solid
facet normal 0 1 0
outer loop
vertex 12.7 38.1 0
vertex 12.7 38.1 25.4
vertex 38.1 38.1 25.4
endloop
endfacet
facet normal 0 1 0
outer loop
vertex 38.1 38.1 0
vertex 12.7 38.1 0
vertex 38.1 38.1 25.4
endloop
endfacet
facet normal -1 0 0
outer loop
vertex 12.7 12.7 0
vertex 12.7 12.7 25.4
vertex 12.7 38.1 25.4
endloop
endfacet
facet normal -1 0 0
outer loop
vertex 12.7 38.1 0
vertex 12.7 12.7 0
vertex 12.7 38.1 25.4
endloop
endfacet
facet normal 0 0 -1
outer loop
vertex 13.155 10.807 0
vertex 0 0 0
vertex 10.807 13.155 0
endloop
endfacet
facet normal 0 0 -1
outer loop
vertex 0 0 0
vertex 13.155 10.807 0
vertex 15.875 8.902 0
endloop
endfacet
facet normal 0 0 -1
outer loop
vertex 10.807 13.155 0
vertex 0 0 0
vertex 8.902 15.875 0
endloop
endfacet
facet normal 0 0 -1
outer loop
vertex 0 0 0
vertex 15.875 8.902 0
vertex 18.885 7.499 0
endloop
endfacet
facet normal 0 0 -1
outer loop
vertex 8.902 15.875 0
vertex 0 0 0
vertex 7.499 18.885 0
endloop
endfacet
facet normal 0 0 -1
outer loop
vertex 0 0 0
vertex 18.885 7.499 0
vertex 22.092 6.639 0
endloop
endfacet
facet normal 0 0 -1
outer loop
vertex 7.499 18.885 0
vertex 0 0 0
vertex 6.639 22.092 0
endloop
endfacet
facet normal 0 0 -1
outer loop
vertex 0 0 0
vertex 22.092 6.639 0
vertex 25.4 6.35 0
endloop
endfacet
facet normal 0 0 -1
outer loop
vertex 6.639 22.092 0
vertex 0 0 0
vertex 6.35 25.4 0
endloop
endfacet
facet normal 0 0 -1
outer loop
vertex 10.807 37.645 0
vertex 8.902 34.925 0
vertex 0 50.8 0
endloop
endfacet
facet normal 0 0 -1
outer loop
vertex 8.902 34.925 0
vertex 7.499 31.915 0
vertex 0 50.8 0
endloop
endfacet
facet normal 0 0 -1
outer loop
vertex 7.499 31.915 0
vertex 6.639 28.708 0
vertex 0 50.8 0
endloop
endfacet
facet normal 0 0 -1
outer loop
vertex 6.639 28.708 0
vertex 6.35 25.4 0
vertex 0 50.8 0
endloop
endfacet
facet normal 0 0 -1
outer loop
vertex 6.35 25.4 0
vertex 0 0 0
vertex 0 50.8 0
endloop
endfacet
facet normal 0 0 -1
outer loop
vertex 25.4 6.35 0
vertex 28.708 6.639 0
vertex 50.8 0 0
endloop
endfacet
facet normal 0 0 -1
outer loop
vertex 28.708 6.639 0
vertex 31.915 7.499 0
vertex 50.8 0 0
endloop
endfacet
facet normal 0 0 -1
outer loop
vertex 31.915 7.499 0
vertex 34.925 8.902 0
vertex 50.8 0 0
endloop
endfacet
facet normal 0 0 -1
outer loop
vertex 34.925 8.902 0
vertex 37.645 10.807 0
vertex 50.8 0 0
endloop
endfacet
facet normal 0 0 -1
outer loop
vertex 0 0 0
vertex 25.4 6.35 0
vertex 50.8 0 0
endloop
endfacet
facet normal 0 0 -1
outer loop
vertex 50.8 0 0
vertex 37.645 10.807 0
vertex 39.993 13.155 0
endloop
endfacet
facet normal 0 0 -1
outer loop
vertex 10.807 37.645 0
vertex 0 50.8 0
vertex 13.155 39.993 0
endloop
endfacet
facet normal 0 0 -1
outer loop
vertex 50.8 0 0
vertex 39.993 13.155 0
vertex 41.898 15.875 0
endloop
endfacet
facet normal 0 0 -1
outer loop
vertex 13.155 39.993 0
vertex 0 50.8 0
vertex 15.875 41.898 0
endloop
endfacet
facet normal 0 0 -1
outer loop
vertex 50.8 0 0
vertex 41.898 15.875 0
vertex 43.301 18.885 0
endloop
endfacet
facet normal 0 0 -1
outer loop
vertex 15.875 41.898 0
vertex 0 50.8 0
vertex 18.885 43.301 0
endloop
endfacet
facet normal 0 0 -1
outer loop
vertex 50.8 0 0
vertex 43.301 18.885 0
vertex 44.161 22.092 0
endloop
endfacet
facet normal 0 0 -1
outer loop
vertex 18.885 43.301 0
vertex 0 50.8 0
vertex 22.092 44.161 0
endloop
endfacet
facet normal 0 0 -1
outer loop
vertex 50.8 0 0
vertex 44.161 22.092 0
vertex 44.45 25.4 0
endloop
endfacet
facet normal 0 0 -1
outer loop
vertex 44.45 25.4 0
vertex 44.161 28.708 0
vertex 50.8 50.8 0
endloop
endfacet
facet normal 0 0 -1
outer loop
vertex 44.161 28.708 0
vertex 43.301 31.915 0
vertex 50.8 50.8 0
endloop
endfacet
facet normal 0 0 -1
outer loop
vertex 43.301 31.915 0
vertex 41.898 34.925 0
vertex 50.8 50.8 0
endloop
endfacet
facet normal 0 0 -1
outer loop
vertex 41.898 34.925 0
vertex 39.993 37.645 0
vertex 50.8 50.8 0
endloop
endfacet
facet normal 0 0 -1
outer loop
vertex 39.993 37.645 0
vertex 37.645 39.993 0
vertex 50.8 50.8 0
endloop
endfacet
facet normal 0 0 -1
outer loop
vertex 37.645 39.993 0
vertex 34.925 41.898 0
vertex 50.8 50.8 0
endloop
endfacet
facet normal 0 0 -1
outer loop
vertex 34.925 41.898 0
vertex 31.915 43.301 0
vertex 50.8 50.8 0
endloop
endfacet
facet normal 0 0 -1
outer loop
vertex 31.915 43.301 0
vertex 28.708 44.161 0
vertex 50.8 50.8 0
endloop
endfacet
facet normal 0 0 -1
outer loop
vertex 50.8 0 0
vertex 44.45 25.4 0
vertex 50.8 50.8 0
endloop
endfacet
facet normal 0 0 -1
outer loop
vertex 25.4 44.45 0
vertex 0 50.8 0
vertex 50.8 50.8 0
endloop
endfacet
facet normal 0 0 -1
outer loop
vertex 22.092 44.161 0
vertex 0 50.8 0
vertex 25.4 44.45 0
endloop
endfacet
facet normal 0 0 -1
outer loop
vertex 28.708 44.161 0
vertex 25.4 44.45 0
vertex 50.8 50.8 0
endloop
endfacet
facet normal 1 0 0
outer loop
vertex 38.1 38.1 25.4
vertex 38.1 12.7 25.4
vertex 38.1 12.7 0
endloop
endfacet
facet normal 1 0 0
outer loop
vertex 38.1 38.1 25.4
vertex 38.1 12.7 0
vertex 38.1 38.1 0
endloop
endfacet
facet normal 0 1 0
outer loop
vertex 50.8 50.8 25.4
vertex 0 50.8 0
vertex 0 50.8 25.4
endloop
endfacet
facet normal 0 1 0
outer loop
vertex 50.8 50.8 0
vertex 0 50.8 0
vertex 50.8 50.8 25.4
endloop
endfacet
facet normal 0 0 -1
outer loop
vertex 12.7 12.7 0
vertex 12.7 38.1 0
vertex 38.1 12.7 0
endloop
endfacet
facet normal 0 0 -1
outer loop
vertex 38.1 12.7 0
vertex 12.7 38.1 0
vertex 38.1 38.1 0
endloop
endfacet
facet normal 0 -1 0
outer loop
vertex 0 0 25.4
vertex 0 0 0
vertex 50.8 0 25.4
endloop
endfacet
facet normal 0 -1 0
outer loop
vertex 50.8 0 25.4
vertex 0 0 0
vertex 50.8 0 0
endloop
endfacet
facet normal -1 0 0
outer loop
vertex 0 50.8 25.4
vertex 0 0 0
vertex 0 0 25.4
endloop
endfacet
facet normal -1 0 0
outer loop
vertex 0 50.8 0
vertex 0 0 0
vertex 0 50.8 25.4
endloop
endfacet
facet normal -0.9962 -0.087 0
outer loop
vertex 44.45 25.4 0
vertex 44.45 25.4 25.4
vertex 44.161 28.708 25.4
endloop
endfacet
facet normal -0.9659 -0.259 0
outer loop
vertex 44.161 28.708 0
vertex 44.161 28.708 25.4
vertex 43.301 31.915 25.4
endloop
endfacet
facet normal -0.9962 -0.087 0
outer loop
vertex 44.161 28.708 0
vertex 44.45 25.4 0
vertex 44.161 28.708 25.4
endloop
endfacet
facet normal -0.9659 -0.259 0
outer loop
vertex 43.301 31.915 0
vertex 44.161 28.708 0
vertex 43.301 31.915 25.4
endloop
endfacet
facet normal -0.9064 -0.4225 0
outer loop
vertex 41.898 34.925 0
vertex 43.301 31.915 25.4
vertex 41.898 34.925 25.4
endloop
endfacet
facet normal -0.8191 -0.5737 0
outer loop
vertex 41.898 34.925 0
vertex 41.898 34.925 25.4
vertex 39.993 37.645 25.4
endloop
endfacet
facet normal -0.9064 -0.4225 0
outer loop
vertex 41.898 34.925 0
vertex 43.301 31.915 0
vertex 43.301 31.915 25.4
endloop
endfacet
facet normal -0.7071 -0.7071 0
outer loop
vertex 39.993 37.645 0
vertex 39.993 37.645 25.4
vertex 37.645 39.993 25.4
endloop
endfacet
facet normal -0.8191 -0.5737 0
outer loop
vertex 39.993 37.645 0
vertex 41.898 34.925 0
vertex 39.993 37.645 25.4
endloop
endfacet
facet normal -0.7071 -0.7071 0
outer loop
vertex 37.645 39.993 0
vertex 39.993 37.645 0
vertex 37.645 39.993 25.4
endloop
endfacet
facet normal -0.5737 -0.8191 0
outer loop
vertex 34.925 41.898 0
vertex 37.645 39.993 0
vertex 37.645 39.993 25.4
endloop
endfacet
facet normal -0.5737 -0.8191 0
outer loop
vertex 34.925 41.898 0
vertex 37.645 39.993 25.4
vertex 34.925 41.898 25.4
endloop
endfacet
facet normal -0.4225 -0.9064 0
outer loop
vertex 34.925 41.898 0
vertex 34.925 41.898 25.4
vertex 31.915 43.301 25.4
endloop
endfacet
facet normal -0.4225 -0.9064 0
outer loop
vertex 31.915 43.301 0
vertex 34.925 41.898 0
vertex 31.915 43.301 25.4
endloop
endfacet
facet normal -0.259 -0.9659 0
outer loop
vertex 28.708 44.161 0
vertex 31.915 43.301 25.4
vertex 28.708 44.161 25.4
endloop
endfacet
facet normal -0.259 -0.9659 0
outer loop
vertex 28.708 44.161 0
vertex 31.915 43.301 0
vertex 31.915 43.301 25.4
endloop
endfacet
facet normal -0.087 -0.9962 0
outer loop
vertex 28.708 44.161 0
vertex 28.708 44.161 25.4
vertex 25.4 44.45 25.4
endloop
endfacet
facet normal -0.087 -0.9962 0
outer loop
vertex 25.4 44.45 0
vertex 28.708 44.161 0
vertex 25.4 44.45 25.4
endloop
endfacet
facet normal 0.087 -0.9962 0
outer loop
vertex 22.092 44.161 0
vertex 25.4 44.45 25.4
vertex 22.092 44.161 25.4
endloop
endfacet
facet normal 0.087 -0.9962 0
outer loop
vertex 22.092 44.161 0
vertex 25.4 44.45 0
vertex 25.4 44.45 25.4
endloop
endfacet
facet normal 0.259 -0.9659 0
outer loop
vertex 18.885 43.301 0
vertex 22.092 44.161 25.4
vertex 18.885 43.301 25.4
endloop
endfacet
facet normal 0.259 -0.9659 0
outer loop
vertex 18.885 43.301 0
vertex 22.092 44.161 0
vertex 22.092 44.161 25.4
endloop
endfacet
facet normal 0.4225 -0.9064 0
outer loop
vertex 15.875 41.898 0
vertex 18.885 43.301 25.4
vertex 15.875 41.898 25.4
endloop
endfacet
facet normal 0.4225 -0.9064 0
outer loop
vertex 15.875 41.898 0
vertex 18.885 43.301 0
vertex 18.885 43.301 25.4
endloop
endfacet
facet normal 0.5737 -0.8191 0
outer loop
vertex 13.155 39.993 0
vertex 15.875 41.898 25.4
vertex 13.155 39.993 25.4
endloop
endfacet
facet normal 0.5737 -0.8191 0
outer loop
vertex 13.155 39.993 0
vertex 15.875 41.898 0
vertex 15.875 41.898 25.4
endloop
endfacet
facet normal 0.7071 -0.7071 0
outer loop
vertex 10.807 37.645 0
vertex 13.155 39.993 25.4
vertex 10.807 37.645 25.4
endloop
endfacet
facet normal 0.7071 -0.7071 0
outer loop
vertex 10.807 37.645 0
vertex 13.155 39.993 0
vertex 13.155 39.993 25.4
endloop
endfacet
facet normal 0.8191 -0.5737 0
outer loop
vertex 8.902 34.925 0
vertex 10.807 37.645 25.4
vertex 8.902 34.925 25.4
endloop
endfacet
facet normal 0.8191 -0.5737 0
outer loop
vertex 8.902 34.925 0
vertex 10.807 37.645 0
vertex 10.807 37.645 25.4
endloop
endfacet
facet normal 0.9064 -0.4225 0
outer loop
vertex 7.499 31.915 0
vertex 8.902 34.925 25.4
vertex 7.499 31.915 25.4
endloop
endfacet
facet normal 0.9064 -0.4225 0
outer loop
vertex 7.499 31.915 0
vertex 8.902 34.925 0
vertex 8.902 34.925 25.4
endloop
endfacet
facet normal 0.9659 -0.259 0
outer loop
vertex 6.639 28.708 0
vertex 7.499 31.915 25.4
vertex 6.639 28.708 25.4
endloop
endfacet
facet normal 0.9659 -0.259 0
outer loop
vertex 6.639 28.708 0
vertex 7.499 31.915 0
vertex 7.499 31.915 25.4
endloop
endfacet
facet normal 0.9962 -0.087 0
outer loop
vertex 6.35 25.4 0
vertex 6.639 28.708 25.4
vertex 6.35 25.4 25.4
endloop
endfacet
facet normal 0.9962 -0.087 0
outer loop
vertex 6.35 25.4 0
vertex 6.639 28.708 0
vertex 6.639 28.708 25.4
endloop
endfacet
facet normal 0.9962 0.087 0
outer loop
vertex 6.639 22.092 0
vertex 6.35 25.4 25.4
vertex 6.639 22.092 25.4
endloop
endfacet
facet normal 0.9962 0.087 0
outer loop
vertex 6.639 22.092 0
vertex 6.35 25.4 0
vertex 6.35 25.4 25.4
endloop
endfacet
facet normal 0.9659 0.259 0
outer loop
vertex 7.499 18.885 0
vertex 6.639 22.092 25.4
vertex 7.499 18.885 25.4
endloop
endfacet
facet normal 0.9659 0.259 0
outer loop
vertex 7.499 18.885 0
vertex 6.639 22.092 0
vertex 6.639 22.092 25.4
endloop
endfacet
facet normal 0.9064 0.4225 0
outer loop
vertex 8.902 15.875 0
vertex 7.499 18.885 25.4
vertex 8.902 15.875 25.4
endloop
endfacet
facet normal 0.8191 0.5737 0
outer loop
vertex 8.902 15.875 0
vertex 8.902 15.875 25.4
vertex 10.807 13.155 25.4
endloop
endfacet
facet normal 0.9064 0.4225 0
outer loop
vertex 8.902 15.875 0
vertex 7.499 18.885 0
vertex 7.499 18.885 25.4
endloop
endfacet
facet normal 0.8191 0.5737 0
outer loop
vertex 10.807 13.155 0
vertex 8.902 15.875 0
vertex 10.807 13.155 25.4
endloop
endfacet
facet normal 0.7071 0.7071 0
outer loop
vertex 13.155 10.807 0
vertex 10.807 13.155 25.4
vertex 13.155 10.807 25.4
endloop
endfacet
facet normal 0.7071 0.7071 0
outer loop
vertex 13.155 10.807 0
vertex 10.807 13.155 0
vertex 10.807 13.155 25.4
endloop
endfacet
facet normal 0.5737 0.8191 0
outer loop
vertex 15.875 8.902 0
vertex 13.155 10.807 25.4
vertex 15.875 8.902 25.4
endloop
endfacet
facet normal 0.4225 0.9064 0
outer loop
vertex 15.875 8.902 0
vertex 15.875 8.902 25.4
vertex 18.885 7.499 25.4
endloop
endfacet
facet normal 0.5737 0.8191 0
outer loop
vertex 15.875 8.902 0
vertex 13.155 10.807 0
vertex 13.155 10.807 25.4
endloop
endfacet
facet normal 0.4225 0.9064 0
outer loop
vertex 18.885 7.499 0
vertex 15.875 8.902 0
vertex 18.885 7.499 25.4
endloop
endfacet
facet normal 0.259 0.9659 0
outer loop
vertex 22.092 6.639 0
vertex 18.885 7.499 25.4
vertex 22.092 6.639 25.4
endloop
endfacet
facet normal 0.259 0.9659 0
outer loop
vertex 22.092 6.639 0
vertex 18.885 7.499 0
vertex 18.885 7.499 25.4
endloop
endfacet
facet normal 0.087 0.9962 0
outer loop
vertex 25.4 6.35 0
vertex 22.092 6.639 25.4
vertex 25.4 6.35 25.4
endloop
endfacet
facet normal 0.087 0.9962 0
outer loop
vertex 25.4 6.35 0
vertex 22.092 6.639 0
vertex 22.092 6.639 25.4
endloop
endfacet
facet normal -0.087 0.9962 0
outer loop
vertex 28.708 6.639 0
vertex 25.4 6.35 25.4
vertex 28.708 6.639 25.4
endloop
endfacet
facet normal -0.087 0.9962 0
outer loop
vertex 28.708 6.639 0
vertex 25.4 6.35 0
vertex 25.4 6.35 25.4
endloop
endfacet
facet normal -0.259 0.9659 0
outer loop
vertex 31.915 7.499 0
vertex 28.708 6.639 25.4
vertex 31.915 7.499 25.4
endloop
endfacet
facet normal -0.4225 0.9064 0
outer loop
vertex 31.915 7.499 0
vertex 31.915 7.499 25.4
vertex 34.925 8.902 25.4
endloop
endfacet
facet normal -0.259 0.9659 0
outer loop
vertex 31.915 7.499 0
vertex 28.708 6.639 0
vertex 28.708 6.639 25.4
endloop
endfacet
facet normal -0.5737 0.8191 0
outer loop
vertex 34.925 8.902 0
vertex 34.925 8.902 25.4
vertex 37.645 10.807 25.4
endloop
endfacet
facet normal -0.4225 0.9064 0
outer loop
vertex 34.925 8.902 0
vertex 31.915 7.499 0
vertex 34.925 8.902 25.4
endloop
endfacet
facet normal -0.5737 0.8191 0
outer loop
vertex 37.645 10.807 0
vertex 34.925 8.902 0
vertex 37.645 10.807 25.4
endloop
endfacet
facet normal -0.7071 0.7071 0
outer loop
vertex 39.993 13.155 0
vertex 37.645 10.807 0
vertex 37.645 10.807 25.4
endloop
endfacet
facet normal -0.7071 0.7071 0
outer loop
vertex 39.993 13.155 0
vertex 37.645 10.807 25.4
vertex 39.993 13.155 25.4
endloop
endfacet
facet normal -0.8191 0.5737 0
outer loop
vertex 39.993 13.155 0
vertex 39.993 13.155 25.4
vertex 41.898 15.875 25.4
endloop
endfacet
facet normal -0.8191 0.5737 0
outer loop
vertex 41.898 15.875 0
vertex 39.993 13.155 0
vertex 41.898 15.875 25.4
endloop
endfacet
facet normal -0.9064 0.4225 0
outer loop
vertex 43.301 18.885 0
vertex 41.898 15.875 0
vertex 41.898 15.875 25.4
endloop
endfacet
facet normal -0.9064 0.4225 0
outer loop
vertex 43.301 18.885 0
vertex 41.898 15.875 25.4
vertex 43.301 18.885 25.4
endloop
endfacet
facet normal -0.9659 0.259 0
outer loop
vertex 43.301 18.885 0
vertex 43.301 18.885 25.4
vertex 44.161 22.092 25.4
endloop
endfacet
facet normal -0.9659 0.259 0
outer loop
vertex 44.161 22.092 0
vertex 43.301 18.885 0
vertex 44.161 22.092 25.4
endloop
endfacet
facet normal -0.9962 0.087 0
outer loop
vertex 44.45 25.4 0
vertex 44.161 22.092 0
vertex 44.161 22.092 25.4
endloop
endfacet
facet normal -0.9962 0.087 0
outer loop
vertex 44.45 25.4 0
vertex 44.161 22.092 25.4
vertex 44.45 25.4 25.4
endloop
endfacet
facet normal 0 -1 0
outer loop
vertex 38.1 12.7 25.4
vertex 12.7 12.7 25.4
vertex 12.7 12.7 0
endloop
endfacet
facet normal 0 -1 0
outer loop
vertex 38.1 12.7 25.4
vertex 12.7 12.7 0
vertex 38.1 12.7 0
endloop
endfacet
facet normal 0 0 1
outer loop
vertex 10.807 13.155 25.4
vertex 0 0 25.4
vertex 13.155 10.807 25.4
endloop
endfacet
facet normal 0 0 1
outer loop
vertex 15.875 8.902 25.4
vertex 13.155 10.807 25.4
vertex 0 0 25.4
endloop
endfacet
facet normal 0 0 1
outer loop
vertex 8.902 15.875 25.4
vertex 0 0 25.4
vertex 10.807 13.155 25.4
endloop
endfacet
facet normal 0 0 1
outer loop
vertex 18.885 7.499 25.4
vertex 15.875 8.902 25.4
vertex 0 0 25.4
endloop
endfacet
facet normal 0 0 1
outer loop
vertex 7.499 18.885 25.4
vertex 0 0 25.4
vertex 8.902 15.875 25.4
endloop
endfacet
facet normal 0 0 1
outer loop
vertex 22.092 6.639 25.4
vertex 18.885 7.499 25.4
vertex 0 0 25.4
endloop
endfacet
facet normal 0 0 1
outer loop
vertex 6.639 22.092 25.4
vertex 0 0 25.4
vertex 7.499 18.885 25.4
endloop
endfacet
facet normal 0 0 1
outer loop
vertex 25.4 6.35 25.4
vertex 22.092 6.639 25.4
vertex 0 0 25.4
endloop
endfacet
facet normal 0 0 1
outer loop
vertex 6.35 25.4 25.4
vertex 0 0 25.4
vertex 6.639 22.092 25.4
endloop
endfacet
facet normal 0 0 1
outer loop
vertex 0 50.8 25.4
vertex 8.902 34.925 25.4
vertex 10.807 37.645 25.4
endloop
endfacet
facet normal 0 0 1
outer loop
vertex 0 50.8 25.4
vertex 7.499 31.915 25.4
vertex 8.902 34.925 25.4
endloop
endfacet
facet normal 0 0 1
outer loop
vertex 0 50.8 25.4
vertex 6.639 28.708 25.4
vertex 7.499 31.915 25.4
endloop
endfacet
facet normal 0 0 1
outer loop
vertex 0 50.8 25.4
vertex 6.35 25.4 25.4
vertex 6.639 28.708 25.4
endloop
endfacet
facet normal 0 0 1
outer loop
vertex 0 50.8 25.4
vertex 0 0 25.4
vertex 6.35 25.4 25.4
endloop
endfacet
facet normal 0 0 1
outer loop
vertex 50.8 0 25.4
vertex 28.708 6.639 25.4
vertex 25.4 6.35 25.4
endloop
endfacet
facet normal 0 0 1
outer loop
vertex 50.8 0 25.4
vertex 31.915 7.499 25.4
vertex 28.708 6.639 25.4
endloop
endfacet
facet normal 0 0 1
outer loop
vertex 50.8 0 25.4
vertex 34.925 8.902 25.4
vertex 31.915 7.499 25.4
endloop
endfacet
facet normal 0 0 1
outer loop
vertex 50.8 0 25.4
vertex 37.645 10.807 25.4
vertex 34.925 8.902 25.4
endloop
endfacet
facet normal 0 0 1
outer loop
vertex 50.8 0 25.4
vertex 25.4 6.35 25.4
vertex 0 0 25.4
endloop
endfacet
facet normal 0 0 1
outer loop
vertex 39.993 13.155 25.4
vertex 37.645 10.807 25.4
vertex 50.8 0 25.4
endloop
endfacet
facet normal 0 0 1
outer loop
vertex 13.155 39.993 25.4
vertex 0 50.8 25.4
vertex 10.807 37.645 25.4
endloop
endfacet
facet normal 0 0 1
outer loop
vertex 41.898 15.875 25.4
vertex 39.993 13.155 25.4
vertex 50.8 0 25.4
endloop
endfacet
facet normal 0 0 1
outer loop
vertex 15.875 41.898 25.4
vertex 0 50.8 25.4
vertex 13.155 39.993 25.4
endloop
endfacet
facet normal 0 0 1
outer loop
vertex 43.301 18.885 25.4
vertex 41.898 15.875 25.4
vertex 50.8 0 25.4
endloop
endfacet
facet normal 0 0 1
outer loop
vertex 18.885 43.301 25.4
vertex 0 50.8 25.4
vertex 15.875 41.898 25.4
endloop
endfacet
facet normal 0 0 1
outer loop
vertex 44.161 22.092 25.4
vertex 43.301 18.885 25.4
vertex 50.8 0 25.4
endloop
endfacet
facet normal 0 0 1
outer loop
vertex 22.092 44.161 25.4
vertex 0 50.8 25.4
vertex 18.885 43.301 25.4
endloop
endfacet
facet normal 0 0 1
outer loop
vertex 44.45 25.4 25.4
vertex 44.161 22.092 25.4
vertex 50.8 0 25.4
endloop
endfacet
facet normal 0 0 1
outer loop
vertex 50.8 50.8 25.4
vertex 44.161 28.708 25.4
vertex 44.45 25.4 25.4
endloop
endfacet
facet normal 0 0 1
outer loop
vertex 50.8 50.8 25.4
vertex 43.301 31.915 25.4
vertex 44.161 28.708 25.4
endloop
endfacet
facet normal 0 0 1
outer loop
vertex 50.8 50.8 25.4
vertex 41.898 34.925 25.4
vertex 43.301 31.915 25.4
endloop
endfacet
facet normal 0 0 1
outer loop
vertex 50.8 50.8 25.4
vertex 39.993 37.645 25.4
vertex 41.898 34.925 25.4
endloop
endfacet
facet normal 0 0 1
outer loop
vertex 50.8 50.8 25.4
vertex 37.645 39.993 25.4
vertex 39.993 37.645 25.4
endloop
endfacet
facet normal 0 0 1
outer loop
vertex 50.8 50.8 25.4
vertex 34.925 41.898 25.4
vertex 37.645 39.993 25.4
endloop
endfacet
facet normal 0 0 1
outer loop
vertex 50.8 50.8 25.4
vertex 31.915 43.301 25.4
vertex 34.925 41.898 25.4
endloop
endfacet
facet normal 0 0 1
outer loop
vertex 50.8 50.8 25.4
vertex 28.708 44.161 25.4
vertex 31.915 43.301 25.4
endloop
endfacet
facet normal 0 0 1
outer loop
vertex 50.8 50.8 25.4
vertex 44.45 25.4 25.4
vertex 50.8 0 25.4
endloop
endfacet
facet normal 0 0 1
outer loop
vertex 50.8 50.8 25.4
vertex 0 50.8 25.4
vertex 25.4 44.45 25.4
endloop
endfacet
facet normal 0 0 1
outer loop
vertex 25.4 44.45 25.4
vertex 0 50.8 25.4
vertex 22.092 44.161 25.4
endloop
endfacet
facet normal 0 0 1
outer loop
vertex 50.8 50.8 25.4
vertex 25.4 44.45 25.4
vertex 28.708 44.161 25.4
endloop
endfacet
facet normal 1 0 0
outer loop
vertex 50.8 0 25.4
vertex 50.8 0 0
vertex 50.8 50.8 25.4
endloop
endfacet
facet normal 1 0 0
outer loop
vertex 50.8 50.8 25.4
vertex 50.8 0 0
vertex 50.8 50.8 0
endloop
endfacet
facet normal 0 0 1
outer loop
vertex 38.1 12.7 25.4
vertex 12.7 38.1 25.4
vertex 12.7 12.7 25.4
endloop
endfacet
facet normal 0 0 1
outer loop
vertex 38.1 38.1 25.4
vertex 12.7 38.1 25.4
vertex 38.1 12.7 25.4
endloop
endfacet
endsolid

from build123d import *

# Parameters (mm, degrees)
F0_W     = 50.8
F0_H     = 50.8
F0_R     = 19.05
F0_W_2   = 25.4
F0_H_2   = 25.4
F1_DEPTH = 25.4


with BuildPart() as f1:
    # F0 (on Top) → F1 (new body)
    with BuildSketch(Plane.XY):
        with Locations((25.4, 25.4)):
            Rectangle(F0_W, F0_H)
        with Locations((25.4, 25.4)):
            Circle(F0_R, mode=Mode.SUBTRACT)
        with Locations((25.4, 25.4)):
            Rectangle(F0_W_2, F0_H_2)
    extrude(amount=F1_DEPTH)


solid = f1.part
